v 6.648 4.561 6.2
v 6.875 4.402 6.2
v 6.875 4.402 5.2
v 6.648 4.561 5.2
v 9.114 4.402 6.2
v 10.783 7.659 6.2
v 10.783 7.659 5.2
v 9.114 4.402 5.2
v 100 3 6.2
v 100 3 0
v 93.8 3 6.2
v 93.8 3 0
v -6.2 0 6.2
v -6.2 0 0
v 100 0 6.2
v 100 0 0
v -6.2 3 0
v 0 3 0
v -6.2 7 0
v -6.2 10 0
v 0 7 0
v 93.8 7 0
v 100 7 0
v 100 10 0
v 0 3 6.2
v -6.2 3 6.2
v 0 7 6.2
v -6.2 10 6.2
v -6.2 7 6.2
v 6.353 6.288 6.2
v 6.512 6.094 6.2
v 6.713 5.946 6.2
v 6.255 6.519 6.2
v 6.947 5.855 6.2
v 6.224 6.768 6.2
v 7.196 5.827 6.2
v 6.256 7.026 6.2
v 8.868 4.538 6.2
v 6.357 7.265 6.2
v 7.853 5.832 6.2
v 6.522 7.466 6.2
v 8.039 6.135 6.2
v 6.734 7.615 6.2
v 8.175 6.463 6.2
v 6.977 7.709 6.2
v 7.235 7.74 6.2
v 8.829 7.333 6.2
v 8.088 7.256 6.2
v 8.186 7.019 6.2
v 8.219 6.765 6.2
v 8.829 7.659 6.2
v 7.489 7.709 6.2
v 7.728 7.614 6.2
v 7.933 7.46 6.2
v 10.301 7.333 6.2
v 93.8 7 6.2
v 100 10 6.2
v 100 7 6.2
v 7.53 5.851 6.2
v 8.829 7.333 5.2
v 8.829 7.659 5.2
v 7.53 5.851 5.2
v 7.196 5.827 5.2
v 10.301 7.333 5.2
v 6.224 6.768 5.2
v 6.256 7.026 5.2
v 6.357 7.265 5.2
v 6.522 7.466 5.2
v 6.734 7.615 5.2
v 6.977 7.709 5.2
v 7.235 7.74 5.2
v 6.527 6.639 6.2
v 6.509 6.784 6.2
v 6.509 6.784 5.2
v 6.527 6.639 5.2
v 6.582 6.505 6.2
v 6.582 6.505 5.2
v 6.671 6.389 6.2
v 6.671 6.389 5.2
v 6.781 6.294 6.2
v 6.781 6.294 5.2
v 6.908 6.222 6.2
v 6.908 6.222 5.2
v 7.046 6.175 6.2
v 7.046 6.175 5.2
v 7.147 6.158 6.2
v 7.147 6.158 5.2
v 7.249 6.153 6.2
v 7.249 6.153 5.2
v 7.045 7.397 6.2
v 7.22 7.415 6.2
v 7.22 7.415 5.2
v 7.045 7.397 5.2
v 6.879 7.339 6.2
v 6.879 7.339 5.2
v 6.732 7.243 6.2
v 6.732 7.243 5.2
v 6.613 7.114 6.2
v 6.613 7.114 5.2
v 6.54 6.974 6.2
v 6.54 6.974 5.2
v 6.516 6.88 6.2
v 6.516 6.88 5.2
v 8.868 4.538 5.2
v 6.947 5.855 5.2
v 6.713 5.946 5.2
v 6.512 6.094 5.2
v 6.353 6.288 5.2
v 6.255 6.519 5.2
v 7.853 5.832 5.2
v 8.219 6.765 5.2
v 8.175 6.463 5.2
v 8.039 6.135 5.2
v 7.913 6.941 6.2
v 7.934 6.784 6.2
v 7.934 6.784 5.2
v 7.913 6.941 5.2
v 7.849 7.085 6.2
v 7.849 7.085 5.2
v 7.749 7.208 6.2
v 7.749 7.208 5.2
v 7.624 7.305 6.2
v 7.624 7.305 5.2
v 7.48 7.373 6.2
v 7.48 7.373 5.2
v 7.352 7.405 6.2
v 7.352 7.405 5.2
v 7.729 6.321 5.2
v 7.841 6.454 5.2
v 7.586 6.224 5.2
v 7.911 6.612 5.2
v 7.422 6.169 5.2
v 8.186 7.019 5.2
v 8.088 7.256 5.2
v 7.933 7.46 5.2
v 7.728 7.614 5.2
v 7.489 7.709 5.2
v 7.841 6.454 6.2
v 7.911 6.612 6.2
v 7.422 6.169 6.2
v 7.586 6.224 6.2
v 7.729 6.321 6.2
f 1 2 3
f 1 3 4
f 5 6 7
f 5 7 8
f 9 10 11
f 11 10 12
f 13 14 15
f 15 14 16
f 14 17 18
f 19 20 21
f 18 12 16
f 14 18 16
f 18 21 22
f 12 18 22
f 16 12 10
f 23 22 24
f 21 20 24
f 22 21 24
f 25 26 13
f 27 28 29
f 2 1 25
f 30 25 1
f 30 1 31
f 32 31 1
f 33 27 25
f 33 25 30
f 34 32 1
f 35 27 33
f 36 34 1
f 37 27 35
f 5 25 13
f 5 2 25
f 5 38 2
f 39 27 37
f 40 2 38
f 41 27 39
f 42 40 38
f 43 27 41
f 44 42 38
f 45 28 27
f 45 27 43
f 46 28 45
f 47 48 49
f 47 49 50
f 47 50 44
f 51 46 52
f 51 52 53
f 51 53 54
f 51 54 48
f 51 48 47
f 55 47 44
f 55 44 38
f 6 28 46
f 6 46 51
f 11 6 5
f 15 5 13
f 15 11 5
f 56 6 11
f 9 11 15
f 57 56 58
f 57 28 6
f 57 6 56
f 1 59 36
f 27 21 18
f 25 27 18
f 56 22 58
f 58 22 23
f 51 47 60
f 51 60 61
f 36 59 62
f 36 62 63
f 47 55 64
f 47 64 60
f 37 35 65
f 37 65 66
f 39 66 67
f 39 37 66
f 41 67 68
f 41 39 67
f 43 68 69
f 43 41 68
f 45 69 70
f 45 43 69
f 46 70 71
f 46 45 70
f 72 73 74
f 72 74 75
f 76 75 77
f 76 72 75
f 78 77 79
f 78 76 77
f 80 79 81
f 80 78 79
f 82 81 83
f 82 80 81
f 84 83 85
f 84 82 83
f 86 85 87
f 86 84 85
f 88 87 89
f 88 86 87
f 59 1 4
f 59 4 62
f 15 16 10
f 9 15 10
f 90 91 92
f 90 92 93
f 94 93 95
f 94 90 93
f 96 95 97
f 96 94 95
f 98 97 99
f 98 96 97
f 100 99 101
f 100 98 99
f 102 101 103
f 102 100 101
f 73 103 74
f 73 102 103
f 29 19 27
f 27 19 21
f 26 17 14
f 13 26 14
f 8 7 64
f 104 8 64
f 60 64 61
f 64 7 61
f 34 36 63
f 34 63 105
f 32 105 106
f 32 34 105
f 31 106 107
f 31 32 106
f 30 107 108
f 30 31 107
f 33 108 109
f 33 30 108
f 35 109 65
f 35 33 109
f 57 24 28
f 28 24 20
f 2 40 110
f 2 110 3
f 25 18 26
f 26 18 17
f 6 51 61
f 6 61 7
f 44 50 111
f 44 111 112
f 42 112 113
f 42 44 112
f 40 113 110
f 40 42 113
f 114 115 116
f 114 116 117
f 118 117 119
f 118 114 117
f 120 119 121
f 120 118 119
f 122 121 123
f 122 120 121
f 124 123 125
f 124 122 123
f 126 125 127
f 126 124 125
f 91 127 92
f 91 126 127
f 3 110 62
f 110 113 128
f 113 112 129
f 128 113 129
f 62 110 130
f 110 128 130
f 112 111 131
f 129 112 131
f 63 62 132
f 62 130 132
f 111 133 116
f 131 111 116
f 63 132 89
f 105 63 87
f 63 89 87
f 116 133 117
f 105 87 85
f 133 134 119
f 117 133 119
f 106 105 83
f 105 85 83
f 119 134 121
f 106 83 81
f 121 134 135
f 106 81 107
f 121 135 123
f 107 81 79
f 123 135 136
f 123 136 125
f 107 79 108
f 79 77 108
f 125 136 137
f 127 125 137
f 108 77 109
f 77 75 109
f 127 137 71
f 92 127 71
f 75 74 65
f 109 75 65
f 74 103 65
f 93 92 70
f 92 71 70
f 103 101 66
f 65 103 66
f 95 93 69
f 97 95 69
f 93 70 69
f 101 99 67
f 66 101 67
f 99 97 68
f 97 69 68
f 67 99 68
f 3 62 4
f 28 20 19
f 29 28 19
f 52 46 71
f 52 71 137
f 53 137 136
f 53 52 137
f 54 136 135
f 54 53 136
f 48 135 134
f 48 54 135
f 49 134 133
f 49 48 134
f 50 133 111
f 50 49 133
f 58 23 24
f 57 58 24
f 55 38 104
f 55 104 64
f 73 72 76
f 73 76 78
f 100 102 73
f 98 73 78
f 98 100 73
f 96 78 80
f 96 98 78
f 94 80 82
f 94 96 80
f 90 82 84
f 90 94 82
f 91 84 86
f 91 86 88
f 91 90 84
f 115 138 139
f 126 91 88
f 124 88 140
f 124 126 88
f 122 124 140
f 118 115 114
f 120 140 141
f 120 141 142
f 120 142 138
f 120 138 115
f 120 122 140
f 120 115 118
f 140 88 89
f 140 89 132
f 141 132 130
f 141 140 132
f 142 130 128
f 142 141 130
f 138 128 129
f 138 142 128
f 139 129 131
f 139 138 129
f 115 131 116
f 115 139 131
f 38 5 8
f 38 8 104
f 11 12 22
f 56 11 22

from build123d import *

# Parameters (mm, degrees)
BOSS_EXTRUDE1_DEPTH = 6.2
CUT_EXTRUDE1_DEPTH  = 1


with BuildPart() as part:
    # Sketch1 → Boss-Extrude1 (new body)
    with BuildSketch(Plane.XY):
        Polygon((0, 3), (-6.2, 3), (-6.2, 0), (100, 0), (100, 3), (93.8, 3), (93.8, 7), (100, 7), (100, 10), (-6.2, 10), (-6.2, 7), (0, 7), align=None)
    extrude(amount=BOSS_EXTRUDE1_DEPTH)

    # Sketch2 → Cut-Extrude1 (cut)
    with BuildSketch(Plane.XY.offset(6.2)):
        with BuildLine():
            Line((6.875309832, 4.402369049), (6.647615521, 4.560737438))
            Line((6.647615521, 4.560737438), (7.530407989, 5.851217206))
            add(Edge.make_bspline(
                [(7.530407989, 5.851217206), (7.474082821, 5.844329213), (7.363175427, 5.83076637), (7.251472484, 5.828274762), (7.196498734, 5.827048536)],
                knots=[0, 0, 0, 0, 0.000170115, 0.000334967, 0.000334967, 0.000334967, 0.000334967], degree=3))
            add(Edge.make_bspline(
                [(7.196498734, 5.827048536), (7.163168448, 5.827902227), (7.097744011, 5.829577947), (7.001558154, 5.842860159), (6.909133396, 5.863316346), (6.820714766, 5.893840574), (6.735969929, 5.931775664), (6.655083889, 5.978817383), (6.578165531, 6.034158805), (6.506040952, 6.097507304), (6.440443875, 6.167065252), (6.382002741, 6.240685014), (6.333433285, 6.319221787), (6.293086668, 6.401073486), (6.262488328, 6.487416569), (6.240206598, 6.577268525), (6.226488462, 6.671259086), (6.224856425, 6.735235454), (6.22402778, 6.767718608)],
                knots=[0, 0, 0, 0, 9.9954e-05, 0.000196201, 0.000290782, 0.000383503, 0.000476303, 0.000568919, 0.000663705, 0.000760153, 0.000856434, 0.000950205, 0.001041624, 0.001132931, 0.001223461, 0.001315861, 0.001410305, 0.001507717, 0.001507717, 0.001507717, 0.001507717], degree=3))
            add(Edge.make_bspline(
                [(6.22402778, 6.767718608), (6.225601161, 6.812140172), (6.228689387, 6.89933069), (6.253543756, 7.02672418), (6.294419921, 7.147180545), (6.351414234, 7.260383078), (6.423200731, 7.364703363), (6.509477809, 7.458691172), (6.609720691, 7.541009718), (6.721645809, 7.61177056), (6.842616049, 7.668680165), (6.969315474, 7.710625816), (7.100773283, 7.735298966), (7.189825384, 7.738551854), (7.234659792, 7.740189562)],
                knots=[0, 0, 0, 0, 0.000133185, 0.000261414, 0.000387724, 0.00051373, 0.000640399, 0.00076644, 0.000895188, 0.001028407, 0.001162697, 0.001295241, 0.001427846, 0.0015623, 0.0015623, 0.0015623, 0.0015623], degree=3))
            add(Edge.make_bspline(
                [(7.234659792, 7.740189562), (7.278645715, 7.738529342), (7.365557754, 7.735248905), (7.49336421, 7.711224162), (7.61577499, 7.670732323), (7.732111513, 7.614775612), (7.839825123, 7.544634503), (7.936686037, 7.461055328), (8.020483848, 7.363986028), (8.091081225, 7.255774326), (8.147750476, 7.139508565), (8.188637476, 7.018147435), (8.213806734, 6.892563738), (8.216978402, 6.807478751), (8.218579062, 6.76453852)],
                knots=[0, 0, 0, 0, 0.000131915, 0.000260652, 0.000388569, 0.000517718, 0.000646848, 0.000773094, 0.000900237, 0.001030248, 0.001159674, 0.001287189, 0.001413545, 0.001542287, 0.001542287, 0.001542287, 0.001542287], degree=3))
            add(Edge.make_bspline(
                [(8.218579062, 6.76453852), (8.217510077, 6.731206674), (8.215341908, 6.663601362), (8.200159687, 6.560885266), (8.174378519, 6.456154507), (8.14512162, 6.36750706), (8.116880297, 6.294292966), (8.090299985, 6.236461176), (8.060806817, 6.175590744), (8.02640908, 6.112319945), (7.989431853, 6.045842216), (7.947649509, 5.976824324), (7.902015169, 5.905173652), (7.869512495, 5.856870936), (7.852868926, 5.832136677)],
                knots=[0, 0, 0, 0, 9.9984e-05, 0.000202793, 0.000310776, 0.000423207, 0.000482616, 0.000546097, 0.000614079, 0.0006855, 0.000762103, 0.000842274, 0.000927493, 0.001016928, 0.001016928, 0.001016928, 0.001016928], degree=3))
            Line((7.852868926, 5.832136677), (6.875309832, 4.402369049))
        make_face()
        with BuildLine():
            add(Edge.make_bspline(
                [(7.249288197, 6.152689562), (7.274537624, 6.153379338), (7.323689675, 6.154722099), (7.395696225, 6.162894769), (7.463663181, 6.177385456), (7.5277721, 6.198176909), (7.588665789, 6.223265459), (7.64537703, 6.25520776), (7.697953284, 6.293322851), (7.746746618, 6.336149079), (7.790075389, 6.383729251), (7.828667995, 6.43352877), (7.861470796, 6.485766237), (7.887381769, 6.541095839), (7.908685633, 6.598170736), (7.923397687, 6.657910044), (7.931547761, 6.720002521), (7.932937118, 6.762183447), (7.933643165, 6.783619049)],
                knots=[0, 0, 0, 0, 7.5753e-05, 0.000147465, 0.000217073, 0.000283852, 0.000349411, 0.000414338, 0.000478589, 0.000543925, 0.000608743, 0.000671332, 0.000732749, 0.000793345, 0.000854313, 0.000915245, 0.00097749, 0.001041807, 0.001041807, 0.001041807, 0.001041807], degree=3))
            add(Edge.make_bspline(
                [(7.933643165, 6.783619049), (7.933035679, 6.805063602), (7.931838555, 6.847322725), (7.922234361, 6.909507132), (7.905338623, 6.969100305), (7.882668683, 7.026428495), (7.852805325, 7.081020689), (7.81697002, 7.133562287), (7.774395583, 7.183720146), (7.725407541, 7.230314617), (7.672580482, 7.273265925), (7.616282743, 7.311171866), (7.556978355, 7.342941094), (7.495029125, 7.369156588), (7.43030598, 7.38961427), (7.362847219, 7.404325737), (7.292311958, 7.4124644), (7.244431791, 7.413844975), (7.220031386, 7.414548536)],
                knots=[0, 0, 0, 0, 6.4316e-05, 0.000126743, 0.000188161, 0.000249812, 0.000311283, 0.000374438, 0.00044032, 0.000508243, 0.00057698, 0.000644365, 0.000711521, 0.0007785, 0.000845884, 0.000914871, 0.00098532, 0.001058531, 0.001058531, 0.001058531, 0.001058531], degree=3))
            add(Edge.make_bspline(
                [(7.220031386, 7.414548536), (7.19584319, 7.413843839), (7.148386148, 7.412461228), (7.078477946, 7.404341207), (7.011475315, 7.389515332), (6.946939703, 7.369166064), (6.884992313, 7.342939138), (6.825690722, 7.311170201), (6.769379814, 7.273274651), (6.716603403, 7.230280821), (6.66752886, 7.183937028), (6.625686416, 7.133342561), (6.589769099, 7.08104802), (6.559946775, 7.026421231), (6.53726592, 6.969102243), (6.520373105, 6.909506607), (6.510768126, 6.847322862), (6.509571109, 6.805063648), (6.508963678, 6.783619049)],
                knots=[0, 0, 0, 0, 7.2576e-05, 0.000142393, 0.000210758, 0.000278143, 0.000345121, 0.000412278, 0.000479663, 0.0005484, 0.000616323, 0.000681795, 0.00074495, 0.000806421, 0.000868072, 0.00092949, 0.000991917, 0.001056233, 0.001056233, 0.001056233, 0.001056233], degree=3))
            add(Edge.make_bspline(
                [(6.508963678, 6.783619049), (6.509513339, 6.762166754), (6.510597373, 6.719858903), (6.521054725, 6.657695675), (6.538542879, 6.598107099), (6.561964754, 6.540513772), (6.592809054, 6.48547573), (6.630658545, 6.433253908), (6.675022861, 6.383256321), (6.725308954, 6.336259779), (6.780343643, 6.293123163), (6.839123548, 6.255449173), (6.900636757, 6.223633456), (6.965099808, 6.198105201), (7.032034976, 6.177593192), (7.102043846, 6.162921475), (7.17489489, 6.154800491), (7.224252516, 6.153399956), (7.249288197, 6.152689562)],
                knots=[0, 0, 0, 0, 6.4316e-05, 0.000126844, 0.000188436, 0.000250326, 0.000312966, 0.000377217, 0.000443451, 0.000513196, 0.000583426, 0.000652939, 0.000722346, 0.000790847, 0.000860662, 0.000932137, 0.001005113, 0.00108023, 0.00108023, 0.00108023, 0.00108023], degree=3))
        make_face(mode=Mode.SUBTRACT)
        Polygon((8.829155986, 7.658779305), (10.783002139, 7.658779305), (9.114091883, 4.402369049), (8.867953061, 4.537840804), (10.300900777, 7.33313828), (8.829155986, 7.33313828), align=None)
    extrude(amount=-CUT_EXTRUDE1_DEPTH, mode=Mode.SUBTRACT)


solid = part.part
